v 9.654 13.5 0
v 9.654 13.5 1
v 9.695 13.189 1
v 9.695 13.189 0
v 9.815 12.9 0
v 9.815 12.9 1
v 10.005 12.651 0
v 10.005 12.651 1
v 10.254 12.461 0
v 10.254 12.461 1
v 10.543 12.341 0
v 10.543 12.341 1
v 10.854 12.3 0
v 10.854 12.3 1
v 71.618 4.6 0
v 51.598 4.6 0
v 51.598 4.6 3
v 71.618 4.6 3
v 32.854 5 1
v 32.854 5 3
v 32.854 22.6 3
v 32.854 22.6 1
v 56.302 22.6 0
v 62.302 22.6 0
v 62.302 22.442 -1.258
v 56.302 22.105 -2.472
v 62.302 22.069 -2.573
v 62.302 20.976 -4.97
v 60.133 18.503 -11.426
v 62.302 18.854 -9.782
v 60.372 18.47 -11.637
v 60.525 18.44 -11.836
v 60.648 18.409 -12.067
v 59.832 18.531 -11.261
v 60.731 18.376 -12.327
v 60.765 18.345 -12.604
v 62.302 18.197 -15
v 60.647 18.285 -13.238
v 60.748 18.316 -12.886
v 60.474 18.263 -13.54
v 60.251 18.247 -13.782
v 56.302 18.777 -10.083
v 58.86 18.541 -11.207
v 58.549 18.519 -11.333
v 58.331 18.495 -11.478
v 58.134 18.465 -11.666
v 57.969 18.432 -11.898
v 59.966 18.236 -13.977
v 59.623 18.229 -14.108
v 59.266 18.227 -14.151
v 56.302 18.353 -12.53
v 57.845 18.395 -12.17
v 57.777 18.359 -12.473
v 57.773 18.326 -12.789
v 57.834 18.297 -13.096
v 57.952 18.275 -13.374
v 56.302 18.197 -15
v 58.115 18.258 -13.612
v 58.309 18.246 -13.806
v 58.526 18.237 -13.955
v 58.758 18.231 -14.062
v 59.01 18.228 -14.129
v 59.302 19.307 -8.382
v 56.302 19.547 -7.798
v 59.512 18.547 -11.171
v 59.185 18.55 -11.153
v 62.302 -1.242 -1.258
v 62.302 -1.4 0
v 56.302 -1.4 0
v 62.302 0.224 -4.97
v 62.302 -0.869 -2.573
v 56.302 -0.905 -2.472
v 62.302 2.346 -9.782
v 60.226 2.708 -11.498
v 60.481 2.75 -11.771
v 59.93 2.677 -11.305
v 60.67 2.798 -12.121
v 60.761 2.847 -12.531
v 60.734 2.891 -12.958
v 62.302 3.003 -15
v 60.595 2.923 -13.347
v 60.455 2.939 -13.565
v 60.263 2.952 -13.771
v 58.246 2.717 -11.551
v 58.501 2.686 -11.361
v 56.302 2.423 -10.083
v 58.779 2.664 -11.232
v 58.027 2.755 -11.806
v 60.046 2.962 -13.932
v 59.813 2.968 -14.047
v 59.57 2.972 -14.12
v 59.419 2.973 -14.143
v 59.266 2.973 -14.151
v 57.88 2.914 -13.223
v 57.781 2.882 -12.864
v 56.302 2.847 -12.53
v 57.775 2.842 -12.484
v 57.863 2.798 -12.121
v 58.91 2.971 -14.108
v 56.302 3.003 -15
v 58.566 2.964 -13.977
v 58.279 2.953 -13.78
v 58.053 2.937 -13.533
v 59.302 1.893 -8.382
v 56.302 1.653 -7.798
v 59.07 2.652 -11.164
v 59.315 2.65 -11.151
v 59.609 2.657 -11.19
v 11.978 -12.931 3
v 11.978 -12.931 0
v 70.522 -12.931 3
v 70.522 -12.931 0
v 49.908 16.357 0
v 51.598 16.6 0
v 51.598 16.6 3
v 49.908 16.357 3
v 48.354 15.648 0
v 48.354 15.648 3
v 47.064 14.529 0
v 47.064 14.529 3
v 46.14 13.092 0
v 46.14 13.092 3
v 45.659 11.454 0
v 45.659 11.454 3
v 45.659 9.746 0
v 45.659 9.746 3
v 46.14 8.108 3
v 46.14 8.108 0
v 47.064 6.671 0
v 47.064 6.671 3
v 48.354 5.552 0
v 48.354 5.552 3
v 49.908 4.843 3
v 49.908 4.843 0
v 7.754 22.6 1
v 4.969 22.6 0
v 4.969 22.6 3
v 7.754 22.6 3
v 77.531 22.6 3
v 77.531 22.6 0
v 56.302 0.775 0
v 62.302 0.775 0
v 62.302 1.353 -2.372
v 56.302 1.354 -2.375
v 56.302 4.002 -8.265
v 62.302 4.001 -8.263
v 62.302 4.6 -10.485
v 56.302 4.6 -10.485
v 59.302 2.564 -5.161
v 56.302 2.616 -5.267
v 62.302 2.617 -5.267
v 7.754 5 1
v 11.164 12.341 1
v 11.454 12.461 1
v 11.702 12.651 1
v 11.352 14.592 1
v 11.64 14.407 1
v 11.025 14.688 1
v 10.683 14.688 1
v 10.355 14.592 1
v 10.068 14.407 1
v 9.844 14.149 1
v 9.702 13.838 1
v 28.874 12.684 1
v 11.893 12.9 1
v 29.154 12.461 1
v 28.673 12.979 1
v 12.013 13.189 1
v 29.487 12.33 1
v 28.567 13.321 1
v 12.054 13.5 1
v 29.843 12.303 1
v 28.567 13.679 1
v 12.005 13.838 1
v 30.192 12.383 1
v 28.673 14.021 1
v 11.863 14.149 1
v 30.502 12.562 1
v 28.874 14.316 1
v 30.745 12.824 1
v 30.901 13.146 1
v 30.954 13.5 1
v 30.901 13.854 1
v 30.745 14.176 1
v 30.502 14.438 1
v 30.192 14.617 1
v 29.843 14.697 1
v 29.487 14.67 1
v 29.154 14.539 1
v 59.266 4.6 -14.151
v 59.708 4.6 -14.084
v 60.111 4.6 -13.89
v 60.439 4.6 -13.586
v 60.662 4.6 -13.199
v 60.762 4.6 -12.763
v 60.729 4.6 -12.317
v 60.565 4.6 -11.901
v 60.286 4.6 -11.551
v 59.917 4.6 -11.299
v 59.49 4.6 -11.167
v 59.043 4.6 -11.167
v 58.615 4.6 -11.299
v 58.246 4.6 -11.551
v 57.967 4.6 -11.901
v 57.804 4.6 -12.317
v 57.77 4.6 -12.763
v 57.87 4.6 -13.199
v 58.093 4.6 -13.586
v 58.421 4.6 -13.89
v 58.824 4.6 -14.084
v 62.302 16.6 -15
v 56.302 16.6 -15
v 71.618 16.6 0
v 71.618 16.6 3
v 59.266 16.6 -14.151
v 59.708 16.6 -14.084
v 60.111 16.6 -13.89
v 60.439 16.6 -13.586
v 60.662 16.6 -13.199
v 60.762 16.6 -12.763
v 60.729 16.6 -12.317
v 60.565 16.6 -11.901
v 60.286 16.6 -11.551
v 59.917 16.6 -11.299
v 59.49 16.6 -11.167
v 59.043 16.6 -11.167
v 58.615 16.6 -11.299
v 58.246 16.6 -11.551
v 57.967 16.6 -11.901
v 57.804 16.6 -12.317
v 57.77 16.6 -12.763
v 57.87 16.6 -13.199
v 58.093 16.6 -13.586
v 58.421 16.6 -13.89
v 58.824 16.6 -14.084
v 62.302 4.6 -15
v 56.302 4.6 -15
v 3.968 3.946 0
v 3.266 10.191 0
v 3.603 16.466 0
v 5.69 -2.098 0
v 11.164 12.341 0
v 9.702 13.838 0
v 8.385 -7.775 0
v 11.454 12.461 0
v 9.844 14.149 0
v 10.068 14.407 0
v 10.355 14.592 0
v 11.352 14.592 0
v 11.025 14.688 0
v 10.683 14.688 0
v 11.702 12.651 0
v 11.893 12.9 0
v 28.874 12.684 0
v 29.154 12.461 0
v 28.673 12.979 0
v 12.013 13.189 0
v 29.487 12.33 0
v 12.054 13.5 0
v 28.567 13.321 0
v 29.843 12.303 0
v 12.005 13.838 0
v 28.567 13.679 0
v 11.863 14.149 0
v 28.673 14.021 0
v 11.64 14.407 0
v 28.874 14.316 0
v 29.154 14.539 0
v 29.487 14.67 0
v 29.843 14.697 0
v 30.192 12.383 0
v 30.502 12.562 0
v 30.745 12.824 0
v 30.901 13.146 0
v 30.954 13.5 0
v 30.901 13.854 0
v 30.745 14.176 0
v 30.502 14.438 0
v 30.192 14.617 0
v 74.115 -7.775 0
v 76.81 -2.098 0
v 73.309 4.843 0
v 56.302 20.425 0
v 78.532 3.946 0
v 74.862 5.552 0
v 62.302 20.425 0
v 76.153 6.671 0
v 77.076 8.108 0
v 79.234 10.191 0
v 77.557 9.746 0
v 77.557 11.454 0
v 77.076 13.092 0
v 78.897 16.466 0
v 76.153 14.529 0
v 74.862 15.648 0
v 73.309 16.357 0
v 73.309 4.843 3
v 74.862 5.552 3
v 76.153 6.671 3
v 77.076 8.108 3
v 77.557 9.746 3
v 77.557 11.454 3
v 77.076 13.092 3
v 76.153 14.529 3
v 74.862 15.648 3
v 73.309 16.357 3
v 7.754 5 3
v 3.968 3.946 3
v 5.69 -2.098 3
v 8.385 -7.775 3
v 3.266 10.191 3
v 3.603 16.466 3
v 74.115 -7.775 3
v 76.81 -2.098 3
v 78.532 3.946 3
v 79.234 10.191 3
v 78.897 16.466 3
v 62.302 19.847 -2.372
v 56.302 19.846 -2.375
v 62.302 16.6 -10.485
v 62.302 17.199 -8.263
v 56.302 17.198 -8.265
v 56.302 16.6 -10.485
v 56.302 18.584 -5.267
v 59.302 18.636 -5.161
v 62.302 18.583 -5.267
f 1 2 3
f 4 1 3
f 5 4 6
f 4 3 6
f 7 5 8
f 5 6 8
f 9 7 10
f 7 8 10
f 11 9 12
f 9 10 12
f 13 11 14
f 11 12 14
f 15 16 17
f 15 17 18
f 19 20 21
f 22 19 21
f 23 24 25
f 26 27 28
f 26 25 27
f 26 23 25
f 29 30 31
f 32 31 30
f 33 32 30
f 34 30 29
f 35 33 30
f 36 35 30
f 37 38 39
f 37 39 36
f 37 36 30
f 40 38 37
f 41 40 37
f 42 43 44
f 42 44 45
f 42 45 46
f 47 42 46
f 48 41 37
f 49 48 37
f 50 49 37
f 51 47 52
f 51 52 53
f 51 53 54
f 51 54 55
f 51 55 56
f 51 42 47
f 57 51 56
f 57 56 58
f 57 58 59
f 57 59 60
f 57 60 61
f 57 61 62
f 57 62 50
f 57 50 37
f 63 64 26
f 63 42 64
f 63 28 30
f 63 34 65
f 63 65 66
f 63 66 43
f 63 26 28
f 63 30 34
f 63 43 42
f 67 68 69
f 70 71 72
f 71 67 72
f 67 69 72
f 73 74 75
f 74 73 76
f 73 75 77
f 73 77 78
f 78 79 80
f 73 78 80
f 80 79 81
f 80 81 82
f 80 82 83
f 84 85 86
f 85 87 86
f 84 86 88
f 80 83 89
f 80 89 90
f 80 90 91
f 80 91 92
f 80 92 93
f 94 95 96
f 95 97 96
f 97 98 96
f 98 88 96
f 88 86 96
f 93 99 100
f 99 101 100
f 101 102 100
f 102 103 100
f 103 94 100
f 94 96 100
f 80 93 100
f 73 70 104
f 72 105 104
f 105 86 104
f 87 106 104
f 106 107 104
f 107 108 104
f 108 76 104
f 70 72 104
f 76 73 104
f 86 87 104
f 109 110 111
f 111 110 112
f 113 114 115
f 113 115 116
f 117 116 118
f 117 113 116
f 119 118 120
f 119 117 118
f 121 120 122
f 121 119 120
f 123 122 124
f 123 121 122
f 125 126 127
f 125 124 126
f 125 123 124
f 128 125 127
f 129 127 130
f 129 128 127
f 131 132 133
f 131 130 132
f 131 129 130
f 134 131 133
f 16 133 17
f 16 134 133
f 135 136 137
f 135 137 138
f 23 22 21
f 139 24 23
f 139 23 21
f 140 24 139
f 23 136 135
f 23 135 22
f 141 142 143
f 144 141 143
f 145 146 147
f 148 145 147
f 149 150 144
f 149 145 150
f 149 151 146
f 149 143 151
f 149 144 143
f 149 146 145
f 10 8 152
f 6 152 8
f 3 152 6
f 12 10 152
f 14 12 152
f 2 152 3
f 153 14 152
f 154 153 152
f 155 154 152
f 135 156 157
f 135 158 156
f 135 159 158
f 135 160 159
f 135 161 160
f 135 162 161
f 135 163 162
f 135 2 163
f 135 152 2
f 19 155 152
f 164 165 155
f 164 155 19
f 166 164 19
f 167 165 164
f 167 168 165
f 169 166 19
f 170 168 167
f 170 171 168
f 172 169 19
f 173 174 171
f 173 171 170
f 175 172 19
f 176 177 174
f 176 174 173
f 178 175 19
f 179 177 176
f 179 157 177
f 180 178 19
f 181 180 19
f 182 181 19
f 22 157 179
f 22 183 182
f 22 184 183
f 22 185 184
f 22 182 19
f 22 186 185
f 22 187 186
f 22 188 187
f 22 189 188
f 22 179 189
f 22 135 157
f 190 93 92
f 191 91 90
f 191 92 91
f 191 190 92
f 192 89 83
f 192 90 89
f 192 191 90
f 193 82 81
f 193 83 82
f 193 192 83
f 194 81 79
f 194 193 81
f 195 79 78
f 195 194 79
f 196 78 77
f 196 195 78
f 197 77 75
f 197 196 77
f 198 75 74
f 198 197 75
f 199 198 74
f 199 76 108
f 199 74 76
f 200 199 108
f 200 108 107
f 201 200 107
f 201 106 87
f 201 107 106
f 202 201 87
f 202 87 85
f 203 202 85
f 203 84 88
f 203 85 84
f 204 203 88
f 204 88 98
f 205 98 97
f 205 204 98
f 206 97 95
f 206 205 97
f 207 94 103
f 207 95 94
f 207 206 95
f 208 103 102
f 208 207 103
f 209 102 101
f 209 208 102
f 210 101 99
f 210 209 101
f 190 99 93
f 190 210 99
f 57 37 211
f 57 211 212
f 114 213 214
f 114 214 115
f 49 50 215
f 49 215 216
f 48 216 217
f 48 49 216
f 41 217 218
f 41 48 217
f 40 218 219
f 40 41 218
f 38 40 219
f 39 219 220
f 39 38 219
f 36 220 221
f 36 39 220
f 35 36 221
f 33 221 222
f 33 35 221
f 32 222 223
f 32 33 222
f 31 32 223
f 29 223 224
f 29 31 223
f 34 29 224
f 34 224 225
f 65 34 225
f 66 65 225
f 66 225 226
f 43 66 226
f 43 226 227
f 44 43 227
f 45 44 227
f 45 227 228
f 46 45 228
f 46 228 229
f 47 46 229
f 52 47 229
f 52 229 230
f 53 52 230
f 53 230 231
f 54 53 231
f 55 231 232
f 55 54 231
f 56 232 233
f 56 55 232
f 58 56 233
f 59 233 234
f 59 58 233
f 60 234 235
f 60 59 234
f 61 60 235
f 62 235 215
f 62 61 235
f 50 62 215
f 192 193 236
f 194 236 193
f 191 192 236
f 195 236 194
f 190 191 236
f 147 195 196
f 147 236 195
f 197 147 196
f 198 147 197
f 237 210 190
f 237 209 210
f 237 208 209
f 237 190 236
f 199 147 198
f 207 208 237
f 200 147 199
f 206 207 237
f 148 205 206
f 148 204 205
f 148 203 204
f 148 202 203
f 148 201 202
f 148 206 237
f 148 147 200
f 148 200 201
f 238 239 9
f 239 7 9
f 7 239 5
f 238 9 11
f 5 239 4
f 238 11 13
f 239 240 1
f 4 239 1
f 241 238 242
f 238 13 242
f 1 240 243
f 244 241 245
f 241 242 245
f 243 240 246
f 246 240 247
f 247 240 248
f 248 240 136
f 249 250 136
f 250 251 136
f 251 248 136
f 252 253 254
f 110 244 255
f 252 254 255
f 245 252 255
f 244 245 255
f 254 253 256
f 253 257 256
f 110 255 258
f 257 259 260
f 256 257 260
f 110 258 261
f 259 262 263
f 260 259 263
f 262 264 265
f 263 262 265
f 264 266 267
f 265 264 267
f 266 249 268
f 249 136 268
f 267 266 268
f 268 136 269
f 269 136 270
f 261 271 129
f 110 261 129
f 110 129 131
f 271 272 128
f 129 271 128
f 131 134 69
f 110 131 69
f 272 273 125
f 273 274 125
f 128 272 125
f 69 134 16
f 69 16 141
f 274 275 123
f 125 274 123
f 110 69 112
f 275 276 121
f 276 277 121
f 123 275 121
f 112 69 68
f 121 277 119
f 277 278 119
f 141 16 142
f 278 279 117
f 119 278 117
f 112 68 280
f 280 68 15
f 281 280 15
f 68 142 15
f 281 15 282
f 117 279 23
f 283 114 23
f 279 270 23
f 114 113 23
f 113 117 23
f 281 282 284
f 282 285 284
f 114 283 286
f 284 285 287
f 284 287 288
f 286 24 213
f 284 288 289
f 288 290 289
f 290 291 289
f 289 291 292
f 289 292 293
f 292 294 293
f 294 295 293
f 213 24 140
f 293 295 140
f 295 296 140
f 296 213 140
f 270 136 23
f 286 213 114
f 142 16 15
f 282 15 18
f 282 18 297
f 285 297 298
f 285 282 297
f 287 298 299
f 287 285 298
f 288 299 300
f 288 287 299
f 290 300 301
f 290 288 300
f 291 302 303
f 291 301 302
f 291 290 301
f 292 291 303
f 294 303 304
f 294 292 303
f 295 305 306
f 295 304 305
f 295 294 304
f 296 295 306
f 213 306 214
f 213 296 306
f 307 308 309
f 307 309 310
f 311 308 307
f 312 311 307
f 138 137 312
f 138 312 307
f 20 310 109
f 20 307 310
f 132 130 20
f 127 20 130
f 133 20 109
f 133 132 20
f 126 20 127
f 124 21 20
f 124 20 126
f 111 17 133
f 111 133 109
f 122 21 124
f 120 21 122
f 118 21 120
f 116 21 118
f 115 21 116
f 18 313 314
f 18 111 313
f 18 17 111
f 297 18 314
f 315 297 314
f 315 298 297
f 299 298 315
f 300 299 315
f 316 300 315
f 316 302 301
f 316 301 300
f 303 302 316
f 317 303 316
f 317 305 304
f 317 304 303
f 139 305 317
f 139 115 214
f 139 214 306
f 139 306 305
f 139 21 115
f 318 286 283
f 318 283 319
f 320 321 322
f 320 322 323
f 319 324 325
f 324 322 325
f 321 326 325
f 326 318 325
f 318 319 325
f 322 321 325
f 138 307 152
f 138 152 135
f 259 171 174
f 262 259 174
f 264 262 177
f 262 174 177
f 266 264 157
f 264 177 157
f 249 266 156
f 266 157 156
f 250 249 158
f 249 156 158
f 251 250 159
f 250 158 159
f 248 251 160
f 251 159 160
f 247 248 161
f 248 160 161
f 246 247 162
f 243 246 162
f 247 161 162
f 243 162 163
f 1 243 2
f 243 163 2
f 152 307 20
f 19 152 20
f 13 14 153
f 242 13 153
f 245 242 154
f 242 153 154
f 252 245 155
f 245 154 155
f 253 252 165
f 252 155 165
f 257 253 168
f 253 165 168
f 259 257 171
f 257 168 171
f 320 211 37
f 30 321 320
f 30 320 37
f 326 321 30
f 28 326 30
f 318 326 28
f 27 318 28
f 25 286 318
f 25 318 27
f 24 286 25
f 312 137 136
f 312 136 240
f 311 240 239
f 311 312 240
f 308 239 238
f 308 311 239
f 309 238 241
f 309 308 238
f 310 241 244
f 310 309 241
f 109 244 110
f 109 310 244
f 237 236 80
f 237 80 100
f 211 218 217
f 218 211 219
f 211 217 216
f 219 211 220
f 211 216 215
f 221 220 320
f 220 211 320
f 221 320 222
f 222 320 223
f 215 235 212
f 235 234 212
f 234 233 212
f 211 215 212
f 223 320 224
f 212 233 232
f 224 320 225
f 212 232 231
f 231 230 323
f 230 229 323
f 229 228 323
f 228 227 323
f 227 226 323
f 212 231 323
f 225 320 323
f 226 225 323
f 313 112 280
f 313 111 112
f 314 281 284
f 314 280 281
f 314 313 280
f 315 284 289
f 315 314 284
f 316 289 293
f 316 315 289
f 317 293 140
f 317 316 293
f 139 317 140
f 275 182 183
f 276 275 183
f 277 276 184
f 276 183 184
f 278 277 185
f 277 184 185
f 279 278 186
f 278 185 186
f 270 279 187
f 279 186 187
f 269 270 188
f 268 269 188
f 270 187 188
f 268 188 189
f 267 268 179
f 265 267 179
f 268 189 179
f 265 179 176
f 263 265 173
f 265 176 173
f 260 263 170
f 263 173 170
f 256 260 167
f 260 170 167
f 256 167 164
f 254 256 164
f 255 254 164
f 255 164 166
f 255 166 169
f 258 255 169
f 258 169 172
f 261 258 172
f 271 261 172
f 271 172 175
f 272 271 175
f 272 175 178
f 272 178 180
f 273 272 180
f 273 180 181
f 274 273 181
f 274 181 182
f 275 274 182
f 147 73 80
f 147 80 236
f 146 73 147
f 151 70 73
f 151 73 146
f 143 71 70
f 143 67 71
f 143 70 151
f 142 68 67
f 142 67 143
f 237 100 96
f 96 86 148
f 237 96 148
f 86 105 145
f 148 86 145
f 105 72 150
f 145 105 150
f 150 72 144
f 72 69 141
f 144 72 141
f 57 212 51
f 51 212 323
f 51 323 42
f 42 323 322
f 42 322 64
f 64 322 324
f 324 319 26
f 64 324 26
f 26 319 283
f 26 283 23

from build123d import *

# Parameters (mm, degrees)
SKETCH5_W               = 82.5
SKETCH5_H               = 35.530981805
BOSS_EXTRUDE1_DEPTH     = 3
SKETCH8_R               = 53.75957742
SKETCH8_R_2             = 38
CUT_EXTRUDE1_DEPTH      = 13
SKETCH7_W               = 25.1
SKETCH7_H               = 23.6
CUT_EXTRUDE2_DEPTH      = 2
SKETCH10_W              = 6
SKETCH10_H              = 6
BOSS_EXTRUDE2_DEPTH     = 15
CUT_EXTRUDE3_DEPTH      = 12
CUT_EXTRUDE4_DEPTH      = 12
CUT_EXTRUDE5_DEPTH      = 17
CUT_EXTRUDE5_DEPTH_BACK = 12
SKETCH15_R              = 1.5
SKETCH16_R              = 1.2
CUT_EXTRUDE6_DEPTH      = 10


with BuildPart() as part:
    # Sketch5 → Boss-Extrude1 (new body)
    with BuildSketch(Plane.XY):
        with Locations((41.25, 4.834509098)):
            Rectangle(SKETCH5_W, SKETCH5_H)
    extrude(amount=BOSS_EXTRUDE1_DEPTH)

    # Sketch8 → Cut-Extrude1 (cut)
    with BuildSketch(Plane.XY.offset(3)):
        with Locations((41.25, 11.3)):
            Circle(SKETCH8_R)
        with Locations((41.25, 11.3)):
            Circle(SKETCH8_R_2, mode=Mode.SUBTRACT)
    extrude(amount=-CUT_EXTRUDE1_DEPTH, mode=Mode.SUBTRACT)

    # Sketch7 → Cut-Extrude2 (cut)
    with BuildSketch(Plane.XY.offset(3)):
        with Locations((20.303816898, 16.8)):
            Rectangle(SKETCH7_W, SKETCH7_H)
    extrude(amount=-CUT_EXTRUDE2_DEPTH, mode=Mode.SUBTRACT)

    # Sketch10 → Boss-Extrude2 (add)
    with BuildSketch(Plane(origin=(0, 0, 0), x_dir=(-1, 0, 0), z_dir=(0, 0, -1))):
        with Locations((-59.301708923, 1.6)):
            Rectangle(SKETCH10_W, SKETCH10_H)
        with Locations((-59.301708923, 19.6)):
            Rectangle(SKETCH10_W, SKETCH10_H)
    extrude(amount=BOSS_EXTRUDE2_DEPTH)

    # Sketch11 → Cut-Extrude3 (cut)
    with BuildSketch(Plane.ZY.offset(-56.301708923)):
        with BuildLine():
            Line((-15.673682817, 18.188265047), (-15.673682817, 24.450923395))
            Line((-15.673682817, 24.450923395), (0, 24.450923395))
            Line((0, 24.450923395), (0, 22.6))
            add(Edge.make_bspline(
                [(0, 22.6), (-3.159886635, 22.462578072), (-7.547752793, 18.690290822), (-13.247203151, 18.200972407), (-15.673682817, 18.188265047)],
                knots=[0, 0, 0, 0, 0.549888978, 1, 1, 1, 1], degree=3))
        make_face()
        with BuildLine():
            Line((-10.484624341, 16.6), (-10.708289412, 12.015073246))
            Line((-10.708289412, 12.015073246), (0, 12.015073246))
            Line((0, 12.015073246), (0, 20.424934677))
            add(Edge.make_bspline(
                [(0, 20.424934677), (-1.83740901, 20.191851474), (-5.266921055, 18.665051954), (-8.555682053, 16.881899659), (-10.484624341, 16.6)],
                knots=[0, 0, 0, 0, 0.489527902, 1, 1, 1, 1], degree=3))
        make_face()
        with BuildLine():
            Line((0, 9.184926754), (0, 0.775065323))
            add(Edge.make_bspline(
                [(0, 0.775065323), (-1.83740901, 1.008148526), (-5.266921055, 2.534948046), (-8.555682053, 4.318100341), (-10.484624341, 4.6)],
                knots=[0, 0, 0, 0, 0.489527902, 1, 1, 1, 1], degree=3))
            Line((-10.484624341, 4.6), (-10.708289412, 9.184926754))
            Line((-10.708289412, 9.184926754), (0, 9.184926754))
        make_face()
        with BuildLine():
            Line((0, -3.250923395), (0, -1.4))
            add(Edge.make_bspline(
                [(0, -1.4), (-3.159886635, -1.262578072), (-7.547752793, 2.509709178), (-13.247203151, 2.999027593), (-15.673682817, 3.011734953)],
                knots=[0, 0, 0, 0, 0.549888978, 1, 1, 1, 1], degree=3))
            Line((-15.673682817, 3.011734953), (-15.673682817, -3.250923395))
            Line((-15.673682817, -3.250923395), (0, -3.250923395))
        make_face()
    extrude(amount=-CUT_EXTRUDE3_DEPTH, mode=Mode.SUBTRACT)

    # Sketch14 → Cut-Extrude4 (cut)
    with BuildSketch(Plane(origin=(0, 0, 0), x_dir=(-1, 0, 0), z_dir=(0, 0, -1))):
        with BuildLine():
            Line((-71.618289014, 16.6), (-51.598213122, 16.6))
            ThreePointArc((-51.598213122, 16.6), (-45.598213122, 10.6), (-51.598213122, 4.6))
            Line((-51.598213122, 4.6), (-71.618289014, 4.6))
            ThreePointArc((-71.618289014, 4.6), (-77.618289014, 10.6), (-71.618289014, 16.6))
        make_face()
    extrude(amount=-CUT_EXTRUDE4_DEPTH, mode=Mode.SUBTRACT)

    # Sketch15 → Cut-Extrude5 (cut, two sides: drawn at the far end of the back side and taken through both)
    with BuildSketch(Plane(origin=(0, 16.6, 0), x_dir=(-1, 0, 0), z_dir=(0, -1, 0)).offset(-CUT_EXTRUDE5_DEPTH_BACK)):
        with Locations(Location((-59.266135992, 12.650675834, 0), (0, 0, 90))):
            Circle(SKETCH15_R)
    extrude(amount=CUT_EXTRUDE5_DEPTH + CUT_EXTRUDE5_DEPTH_BACK, mode=Mode.SUBTRACT)

    # Sketch16 → Cut-Extrude6 (cut)
    with BuildSketch(Plane.XY.offset(1)):
        with BuildLine():
            ThreePointArc((12.053816898, 13.5), (10.853816898, 14.7), (9.653816898, 13.5))
            Line((9.653816898, 13.5), (10.853816898, 13.5))
            Line((10.853816898, 13.5), (10.853816898, 12.3))
            ThreePointArc((10.853816898, 12.3), (11.702345036, 12.651471863), (12.053816898, 13.5))
        make_face()
        with BuildLine():
            Line((10.853816898, 13.5), (9.653816898, 13.5))
            ThreePointArc((9.653816898, 13.5), (10.005288761, 12.651471863), (10.853816898, 12.3))
            Line((10.853816898, 12.3), (10.853816898, 13.5))
        make_face()
        with Locations((29.753816898, 13.5)):
            Circle(SKETCH16_R)
    extrude(amount=-CUT_EXTRUDE6_DEPTH, mode=Mode.SUBTRACT)


solid = part.part
